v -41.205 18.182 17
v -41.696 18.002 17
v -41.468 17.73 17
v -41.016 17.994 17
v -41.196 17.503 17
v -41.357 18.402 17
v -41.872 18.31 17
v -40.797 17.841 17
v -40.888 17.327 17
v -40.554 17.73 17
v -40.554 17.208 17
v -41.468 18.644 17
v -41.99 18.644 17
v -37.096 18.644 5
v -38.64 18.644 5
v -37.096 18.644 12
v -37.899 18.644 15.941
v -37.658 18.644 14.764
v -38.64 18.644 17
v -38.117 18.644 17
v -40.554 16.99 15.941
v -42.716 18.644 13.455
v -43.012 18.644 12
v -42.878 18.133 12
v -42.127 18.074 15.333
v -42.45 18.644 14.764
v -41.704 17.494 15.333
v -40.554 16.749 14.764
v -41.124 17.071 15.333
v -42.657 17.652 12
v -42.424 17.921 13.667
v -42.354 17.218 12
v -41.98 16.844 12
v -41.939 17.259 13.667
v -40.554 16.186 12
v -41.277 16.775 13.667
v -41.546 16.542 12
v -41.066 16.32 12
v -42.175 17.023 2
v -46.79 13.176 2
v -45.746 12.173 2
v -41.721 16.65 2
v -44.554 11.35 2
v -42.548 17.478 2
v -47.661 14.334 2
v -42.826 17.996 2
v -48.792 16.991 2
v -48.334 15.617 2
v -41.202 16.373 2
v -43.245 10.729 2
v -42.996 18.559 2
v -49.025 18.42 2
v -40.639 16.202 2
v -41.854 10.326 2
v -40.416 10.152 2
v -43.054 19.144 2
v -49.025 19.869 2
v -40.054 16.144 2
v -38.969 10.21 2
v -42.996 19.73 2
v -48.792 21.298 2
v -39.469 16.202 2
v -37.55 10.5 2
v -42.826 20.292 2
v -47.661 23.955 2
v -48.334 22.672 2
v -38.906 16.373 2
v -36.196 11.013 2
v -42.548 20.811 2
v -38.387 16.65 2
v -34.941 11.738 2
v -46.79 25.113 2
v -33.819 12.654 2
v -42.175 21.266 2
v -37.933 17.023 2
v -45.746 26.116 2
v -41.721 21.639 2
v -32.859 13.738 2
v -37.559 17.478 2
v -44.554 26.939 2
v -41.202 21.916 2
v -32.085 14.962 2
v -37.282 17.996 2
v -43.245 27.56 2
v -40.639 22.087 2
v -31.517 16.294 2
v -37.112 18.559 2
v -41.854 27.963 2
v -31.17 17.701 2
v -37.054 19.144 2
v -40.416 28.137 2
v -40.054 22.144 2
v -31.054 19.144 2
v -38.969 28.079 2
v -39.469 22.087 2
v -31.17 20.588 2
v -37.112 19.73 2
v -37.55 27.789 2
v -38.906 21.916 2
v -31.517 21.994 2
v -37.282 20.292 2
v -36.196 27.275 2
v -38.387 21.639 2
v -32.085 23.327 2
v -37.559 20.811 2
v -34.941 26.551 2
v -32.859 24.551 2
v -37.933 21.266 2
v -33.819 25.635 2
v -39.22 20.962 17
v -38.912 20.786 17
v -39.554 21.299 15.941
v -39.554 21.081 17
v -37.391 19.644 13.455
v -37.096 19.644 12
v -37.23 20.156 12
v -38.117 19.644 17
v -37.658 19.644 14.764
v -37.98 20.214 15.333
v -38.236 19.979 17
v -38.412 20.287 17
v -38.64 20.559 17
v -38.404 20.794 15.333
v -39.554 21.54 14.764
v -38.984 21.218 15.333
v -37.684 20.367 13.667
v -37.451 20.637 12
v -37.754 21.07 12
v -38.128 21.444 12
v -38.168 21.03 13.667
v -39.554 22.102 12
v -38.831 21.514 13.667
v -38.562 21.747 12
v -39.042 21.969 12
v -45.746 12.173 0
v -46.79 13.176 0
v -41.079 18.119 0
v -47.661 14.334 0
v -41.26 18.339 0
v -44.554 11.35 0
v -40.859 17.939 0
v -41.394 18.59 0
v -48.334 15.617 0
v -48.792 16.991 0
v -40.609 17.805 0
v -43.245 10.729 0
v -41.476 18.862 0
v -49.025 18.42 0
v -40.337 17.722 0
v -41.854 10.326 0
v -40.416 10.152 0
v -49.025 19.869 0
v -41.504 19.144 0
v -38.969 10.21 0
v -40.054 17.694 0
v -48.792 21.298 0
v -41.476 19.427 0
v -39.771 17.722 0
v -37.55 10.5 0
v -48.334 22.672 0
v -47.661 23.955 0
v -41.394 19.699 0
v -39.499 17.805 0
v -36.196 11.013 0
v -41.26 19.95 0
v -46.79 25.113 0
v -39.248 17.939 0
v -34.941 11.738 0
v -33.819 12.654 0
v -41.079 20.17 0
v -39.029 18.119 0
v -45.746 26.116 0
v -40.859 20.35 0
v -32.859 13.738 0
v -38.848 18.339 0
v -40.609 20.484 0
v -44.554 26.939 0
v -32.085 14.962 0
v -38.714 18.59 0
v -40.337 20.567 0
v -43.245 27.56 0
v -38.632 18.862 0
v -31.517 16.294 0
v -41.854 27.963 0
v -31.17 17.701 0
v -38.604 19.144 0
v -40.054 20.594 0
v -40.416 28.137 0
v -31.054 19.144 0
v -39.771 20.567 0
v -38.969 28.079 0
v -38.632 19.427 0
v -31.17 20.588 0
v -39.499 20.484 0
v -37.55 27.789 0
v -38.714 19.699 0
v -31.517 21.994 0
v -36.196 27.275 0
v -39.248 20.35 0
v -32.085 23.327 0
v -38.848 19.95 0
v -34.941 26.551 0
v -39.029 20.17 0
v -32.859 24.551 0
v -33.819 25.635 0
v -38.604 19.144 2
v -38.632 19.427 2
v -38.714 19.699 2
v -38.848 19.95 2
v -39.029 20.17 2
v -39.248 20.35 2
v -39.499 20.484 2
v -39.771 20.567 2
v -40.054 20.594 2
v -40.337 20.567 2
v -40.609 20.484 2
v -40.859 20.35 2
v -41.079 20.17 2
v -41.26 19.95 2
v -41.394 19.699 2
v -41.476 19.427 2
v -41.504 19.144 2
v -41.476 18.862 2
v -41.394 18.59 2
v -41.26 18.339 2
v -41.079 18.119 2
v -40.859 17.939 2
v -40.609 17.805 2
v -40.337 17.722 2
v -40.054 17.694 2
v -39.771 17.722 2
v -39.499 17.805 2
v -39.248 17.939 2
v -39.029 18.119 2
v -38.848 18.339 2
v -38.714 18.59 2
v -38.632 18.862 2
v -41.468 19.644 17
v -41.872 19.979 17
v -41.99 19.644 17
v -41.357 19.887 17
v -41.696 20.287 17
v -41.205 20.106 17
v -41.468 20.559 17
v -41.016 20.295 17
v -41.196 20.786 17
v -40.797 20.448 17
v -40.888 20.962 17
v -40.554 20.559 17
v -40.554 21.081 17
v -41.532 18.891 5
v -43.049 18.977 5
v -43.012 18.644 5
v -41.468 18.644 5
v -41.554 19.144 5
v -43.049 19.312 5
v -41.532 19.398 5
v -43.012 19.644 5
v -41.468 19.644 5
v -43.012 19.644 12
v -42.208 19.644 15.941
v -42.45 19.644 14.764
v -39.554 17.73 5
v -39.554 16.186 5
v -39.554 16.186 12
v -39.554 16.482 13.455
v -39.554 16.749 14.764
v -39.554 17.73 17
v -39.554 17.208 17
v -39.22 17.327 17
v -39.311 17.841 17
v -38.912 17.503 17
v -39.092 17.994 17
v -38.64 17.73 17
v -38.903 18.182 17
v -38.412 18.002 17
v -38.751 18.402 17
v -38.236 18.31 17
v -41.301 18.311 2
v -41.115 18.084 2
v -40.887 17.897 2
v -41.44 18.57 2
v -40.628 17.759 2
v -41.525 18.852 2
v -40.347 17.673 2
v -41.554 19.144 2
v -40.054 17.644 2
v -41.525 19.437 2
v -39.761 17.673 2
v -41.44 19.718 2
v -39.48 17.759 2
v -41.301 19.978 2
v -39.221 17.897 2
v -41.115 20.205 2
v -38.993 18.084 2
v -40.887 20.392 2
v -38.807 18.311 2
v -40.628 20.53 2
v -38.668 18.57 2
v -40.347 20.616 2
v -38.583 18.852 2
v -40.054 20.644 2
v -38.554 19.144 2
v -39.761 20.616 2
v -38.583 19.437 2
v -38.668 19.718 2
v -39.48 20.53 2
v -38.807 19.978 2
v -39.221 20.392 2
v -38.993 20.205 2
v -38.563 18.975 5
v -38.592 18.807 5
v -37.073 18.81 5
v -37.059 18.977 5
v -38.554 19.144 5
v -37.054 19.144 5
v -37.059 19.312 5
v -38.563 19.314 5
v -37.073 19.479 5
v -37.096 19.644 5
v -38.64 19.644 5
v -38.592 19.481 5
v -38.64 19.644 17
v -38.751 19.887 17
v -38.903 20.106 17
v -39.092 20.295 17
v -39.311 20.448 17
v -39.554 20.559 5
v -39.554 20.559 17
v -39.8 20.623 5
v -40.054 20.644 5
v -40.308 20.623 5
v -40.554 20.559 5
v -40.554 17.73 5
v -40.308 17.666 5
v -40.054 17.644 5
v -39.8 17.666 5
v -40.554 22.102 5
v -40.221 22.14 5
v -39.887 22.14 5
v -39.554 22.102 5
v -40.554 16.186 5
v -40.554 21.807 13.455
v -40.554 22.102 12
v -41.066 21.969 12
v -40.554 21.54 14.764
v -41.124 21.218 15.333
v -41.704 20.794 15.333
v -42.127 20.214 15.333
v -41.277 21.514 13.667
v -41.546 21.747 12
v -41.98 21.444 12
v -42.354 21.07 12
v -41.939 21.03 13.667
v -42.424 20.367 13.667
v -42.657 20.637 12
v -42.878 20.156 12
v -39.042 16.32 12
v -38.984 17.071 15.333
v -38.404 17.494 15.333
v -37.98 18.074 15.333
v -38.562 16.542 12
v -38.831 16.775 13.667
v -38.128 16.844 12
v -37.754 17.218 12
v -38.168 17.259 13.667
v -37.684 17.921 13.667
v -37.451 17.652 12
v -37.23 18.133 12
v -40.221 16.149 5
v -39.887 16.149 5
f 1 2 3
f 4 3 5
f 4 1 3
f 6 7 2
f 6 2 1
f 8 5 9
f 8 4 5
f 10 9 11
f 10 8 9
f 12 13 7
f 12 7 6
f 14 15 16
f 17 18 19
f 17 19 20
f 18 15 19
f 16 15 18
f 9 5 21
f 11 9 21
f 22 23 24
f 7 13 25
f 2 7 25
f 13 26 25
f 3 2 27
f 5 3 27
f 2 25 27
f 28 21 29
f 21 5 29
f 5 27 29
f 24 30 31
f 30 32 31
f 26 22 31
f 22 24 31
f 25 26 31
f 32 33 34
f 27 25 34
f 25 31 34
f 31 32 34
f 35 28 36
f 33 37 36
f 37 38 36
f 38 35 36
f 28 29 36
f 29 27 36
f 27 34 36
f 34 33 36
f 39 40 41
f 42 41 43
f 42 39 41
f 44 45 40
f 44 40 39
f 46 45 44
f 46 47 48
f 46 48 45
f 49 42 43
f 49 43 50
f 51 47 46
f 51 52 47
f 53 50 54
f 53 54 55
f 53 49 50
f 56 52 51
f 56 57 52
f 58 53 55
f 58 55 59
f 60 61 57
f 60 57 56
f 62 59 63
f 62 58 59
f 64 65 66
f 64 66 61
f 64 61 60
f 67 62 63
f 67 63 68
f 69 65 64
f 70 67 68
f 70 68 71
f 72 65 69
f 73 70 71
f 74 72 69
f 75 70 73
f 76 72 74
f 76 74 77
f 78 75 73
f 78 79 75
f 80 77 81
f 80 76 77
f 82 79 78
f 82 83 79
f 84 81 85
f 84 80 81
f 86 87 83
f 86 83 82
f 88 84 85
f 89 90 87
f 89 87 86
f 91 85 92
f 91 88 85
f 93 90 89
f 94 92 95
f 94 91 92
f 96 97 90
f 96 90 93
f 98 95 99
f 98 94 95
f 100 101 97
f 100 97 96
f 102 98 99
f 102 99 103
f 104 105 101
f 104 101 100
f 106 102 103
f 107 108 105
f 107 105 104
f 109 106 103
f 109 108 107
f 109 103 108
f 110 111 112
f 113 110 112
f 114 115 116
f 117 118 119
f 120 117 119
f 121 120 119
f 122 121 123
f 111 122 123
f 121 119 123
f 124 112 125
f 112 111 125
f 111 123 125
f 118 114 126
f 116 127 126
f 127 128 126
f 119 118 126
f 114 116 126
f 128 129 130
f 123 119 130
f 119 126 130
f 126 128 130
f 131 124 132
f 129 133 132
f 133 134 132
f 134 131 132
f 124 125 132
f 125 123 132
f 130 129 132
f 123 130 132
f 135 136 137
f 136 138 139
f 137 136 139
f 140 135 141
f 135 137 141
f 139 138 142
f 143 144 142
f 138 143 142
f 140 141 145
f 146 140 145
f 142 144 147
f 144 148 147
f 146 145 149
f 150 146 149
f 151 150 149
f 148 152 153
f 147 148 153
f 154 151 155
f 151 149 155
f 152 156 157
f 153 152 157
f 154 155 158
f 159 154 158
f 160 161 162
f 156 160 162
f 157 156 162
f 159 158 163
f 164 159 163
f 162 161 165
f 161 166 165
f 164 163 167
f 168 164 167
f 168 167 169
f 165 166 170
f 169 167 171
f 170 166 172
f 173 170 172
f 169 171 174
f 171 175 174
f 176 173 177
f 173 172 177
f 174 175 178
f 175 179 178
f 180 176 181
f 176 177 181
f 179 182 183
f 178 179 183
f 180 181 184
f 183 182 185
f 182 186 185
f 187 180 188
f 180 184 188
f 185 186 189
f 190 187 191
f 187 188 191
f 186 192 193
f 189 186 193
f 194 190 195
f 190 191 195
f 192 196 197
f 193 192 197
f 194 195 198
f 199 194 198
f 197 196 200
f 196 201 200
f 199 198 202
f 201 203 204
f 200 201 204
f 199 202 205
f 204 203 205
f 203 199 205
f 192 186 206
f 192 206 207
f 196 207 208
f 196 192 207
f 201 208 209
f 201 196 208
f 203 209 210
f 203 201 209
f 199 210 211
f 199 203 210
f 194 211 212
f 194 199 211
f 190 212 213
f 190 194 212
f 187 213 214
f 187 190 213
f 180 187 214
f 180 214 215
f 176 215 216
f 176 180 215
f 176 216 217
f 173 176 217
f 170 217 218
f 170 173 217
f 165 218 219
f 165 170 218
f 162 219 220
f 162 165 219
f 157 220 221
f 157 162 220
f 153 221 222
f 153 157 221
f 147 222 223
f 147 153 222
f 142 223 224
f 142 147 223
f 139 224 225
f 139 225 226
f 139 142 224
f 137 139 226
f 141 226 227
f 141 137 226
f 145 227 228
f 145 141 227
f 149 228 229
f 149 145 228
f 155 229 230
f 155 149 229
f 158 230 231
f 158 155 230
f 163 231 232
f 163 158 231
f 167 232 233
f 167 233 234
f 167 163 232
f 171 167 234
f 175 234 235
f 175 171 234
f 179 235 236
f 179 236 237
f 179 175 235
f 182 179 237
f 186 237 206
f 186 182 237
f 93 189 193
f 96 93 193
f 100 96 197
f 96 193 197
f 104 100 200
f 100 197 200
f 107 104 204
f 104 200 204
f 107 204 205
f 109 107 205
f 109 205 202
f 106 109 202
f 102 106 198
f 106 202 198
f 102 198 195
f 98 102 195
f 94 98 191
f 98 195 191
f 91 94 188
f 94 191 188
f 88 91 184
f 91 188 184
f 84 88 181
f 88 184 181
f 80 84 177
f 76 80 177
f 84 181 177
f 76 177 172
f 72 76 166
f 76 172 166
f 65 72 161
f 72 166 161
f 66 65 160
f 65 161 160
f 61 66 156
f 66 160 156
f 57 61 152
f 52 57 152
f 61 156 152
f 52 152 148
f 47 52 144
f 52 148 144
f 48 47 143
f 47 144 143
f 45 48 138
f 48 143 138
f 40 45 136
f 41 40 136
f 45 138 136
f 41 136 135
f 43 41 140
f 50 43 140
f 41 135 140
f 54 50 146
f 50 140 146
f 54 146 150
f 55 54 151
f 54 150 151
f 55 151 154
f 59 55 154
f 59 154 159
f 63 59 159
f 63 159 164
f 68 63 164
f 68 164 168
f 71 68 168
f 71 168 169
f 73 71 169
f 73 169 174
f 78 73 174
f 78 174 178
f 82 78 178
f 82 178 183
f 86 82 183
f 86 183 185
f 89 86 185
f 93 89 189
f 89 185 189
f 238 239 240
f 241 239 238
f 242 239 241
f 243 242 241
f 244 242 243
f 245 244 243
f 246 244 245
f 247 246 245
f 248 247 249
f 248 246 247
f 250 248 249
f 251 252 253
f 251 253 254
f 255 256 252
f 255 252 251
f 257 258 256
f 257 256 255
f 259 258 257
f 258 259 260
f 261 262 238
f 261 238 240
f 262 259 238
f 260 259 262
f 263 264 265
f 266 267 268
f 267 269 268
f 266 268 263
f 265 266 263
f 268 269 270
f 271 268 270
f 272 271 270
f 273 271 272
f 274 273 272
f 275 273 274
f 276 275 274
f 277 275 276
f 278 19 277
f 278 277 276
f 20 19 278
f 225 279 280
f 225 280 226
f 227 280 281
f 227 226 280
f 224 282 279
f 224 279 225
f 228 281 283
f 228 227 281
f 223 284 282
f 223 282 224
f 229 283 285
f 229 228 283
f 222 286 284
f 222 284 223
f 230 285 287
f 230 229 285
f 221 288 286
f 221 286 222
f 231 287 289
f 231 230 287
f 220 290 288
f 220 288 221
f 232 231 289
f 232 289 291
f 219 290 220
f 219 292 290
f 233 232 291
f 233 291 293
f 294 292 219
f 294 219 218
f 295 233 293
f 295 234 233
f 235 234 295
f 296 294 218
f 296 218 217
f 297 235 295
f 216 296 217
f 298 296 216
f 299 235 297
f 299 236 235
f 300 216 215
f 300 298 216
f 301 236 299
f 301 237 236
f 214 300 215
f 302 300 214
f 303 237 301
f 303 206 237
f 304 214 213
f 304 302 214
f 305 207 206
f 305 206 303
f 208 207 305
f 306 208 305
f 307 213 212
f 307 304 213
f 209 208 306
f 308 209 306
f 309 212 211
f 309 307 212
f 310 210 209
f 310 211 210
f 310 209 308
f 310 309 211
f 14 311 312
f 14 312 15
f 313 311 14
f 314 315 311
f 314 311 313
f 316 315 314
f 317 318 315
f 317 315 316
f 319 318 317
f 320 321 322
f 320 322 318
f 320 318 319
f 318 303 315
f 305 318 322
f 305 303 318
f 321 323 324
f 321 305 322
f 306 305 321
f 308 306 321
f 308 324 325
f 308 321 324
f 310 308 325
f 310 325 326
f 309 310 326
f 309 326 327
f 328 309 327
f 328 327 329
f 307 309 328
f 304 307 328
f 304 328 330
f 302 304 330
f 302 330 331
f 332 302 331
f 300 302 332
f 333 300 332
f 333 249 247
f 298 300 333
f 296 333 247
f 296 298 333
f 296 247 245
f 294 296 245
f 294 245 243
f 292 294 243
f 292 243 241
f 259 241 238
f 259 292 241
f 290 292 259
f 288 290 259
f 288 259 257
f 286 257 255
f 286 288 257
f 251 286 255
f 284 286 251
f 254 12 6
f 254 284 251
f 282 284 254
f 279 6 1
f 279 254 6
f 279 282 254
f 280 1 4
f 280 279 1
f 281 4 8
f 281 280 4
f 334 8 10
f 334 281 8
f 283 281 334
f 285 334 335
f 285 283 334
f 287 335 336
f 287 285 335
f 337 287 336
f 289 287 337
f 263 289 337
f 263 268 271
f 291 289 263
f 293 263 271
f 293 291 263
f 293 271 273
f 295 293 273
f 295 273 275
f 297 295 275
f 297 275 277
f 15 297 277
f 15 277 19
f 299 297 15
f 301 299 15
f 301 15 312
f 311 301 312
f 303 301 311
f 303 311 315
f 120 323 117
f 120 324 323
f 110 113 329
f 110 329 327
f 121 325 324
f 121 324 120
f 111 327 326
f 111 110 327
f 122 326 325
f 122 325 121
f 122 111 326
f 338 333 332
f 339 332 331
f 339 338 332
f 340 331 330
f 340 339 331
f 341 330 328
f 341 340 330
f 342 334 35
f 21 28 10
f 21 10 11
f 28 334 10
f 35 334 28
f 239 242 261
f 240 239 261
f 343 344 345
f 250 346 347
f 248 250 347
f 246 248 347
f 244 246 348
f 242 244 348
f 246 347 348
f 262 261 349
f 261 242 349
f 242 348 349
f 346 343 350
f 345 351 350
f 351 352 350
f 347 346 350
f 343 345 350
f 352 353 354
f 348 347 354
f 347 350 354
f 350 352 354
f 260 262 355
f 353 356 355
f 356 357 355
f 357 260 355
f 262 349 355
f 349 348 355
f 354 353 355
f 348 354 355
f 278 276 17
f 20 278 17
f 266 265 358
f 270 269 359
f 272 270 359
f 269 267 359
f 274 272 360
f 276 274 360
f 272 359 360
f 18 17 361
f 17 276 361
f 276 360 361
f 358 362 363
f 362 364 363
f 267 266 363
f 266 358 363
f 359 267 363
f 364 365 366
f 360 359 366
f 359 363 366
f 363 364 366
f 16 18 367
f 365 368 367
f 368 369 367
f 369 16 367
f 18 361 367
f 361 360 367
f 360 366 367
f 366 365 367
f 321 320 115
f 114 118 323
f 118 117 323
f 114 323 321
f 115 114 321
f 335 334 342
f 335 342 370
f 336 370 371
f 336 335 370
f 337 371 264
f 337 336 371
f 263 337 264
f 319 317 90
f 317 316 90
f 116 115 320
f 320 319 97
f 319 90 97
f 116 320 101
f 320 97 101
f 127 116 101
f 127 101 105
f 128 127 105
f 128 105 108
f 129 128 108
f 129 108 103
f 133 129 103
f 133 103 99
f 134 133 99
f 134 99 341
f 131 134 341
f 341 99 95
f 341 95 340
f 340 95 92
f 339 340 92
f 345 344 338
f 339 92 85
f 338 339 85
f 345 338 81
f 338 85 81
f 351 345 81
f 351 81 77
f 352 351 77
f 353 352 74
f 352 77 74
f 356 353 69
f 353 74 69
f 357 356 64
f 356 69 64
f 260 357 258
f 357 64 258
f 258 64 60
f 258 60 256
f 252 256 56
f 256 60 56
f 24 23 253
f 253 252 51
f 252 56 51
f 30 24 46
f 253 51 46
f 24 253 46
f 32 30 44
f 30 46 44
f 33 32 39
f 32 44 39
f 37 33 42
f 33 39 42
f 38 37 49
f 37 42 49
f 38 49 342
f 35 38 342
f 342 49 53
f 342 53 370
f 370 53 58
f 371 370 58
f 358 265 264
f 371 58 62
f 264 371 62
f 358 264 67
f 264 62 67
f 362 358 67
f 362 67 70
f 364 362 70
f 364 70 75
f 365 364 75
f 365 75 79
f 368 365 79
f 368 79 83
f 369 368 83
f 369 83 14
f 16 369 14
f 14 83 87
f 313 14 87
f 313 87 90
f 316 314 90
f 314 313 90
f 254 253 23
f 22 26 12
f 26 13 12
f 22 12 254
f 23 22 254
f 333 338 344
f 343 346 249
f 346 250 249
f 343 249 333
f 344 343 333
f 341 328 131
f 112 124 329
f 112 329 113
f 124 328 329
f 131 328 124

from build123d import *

# Parameters (mm, degrees)
F0_R     = 9
F0_R_2   = 1.45
F1_DEPTH = 2
F2_R     = 3
F2_R_2   = 1.5
F3_DEPTH = 15
F5_SIZE2 = 5
F5_SIZE  = 1
F6_DEPTH = 12


with BuildPart() as f1:
    # F0 (on Top) → F1 (new body)
    with BuildSketch(Plane.XY):
        with Locations((-40.0538817048, 19.144397229)):
            Circle(F0_R)
        with Locations((-40.0538817048, 19.144397229)):
            Circle(F0_R_2, mode=Mode.SUBTRACT)
    extrude(amount=F1_DEPTH)

    # F2 (on face) → F3 (join)
    with BuildSketch(Plane.XY.offset(2)):
        with Locations((-40.0538817048, 19.144397229)):
            Circle(F2_R)
        with Locations((-40.0538817048, 19.144397229)):
            Circle(F2_R_2, mode=Mode.SUBTRACT)
    extrude(amount=F3_DEPTH)

    # F5
    f5_edges = [f1.edges().sort_by_distance(p)[0] for p in [
        (-43.053882, 19.144397, 17),
    ]]
    f5_side = f1.faces().sort_by_distance((-42.969029, 19.144397, 17))[0]
    chamfer(f5_edges, length=F5_SIZE, length2=F5_SIZE2, reference=f5_side)

    # F4 (on face) → F6 (cut)
    with BuildSketch(Plane.XY.offset(17)):
        Polygon((-40.5538817048, 19.644397229), (-40.0538817048, 19.644397229), (-39.5538817048, 19.644397229), (-39.5538817048, 23.144397229), (-40.0538817048, 23.144397229), (-40.5538817048, 23.144397229), align=None)
        Polygon((-39.5538817048, 19.644397229), (-40.0538817048, 19.644397229), (-40.5538817048, 19.644397229), (-40.5538817048, 19.144397229), (-40.5538817048, 18.644397229), (-40.0538817048, 18.644397229), (-39.5538817048, 18.644397229), (-39.5538817048, 19.144397229), align=None)
        Polygon((-36.0538817048, 19.644397229), (-39.5538817048, 19.644397229), (-39.5538817048, 19.144397229), (-39.5538817048, 18.644397229), (-36.0538817048, 18.644397229), (-36.0538817048, 19.144397229), align=None)
        Polygon((-40.5538817048, 19.144397229), (-40.5538817048, 19.644397229), (-44.0538817048, 19.644397229), (-44.0538817048, 19.144397229), (-44.0538817048, 18.644397229), (-40.5538817048, 18.644397229), align=None)
        Polygon((-39.5538817048, 15.144397229), (-39.5538817048, 18.644397229), (-40.0538817048, 18.644397229), (-40.5538817048, 18.644397229), (-40.5538817048, 15.144397229), (-40.0538817048, 15.144397229), align=None)
    extrude(amount=-F6_DEPTH, mode=Mode.SUBTRACT)


solid = f1.part
